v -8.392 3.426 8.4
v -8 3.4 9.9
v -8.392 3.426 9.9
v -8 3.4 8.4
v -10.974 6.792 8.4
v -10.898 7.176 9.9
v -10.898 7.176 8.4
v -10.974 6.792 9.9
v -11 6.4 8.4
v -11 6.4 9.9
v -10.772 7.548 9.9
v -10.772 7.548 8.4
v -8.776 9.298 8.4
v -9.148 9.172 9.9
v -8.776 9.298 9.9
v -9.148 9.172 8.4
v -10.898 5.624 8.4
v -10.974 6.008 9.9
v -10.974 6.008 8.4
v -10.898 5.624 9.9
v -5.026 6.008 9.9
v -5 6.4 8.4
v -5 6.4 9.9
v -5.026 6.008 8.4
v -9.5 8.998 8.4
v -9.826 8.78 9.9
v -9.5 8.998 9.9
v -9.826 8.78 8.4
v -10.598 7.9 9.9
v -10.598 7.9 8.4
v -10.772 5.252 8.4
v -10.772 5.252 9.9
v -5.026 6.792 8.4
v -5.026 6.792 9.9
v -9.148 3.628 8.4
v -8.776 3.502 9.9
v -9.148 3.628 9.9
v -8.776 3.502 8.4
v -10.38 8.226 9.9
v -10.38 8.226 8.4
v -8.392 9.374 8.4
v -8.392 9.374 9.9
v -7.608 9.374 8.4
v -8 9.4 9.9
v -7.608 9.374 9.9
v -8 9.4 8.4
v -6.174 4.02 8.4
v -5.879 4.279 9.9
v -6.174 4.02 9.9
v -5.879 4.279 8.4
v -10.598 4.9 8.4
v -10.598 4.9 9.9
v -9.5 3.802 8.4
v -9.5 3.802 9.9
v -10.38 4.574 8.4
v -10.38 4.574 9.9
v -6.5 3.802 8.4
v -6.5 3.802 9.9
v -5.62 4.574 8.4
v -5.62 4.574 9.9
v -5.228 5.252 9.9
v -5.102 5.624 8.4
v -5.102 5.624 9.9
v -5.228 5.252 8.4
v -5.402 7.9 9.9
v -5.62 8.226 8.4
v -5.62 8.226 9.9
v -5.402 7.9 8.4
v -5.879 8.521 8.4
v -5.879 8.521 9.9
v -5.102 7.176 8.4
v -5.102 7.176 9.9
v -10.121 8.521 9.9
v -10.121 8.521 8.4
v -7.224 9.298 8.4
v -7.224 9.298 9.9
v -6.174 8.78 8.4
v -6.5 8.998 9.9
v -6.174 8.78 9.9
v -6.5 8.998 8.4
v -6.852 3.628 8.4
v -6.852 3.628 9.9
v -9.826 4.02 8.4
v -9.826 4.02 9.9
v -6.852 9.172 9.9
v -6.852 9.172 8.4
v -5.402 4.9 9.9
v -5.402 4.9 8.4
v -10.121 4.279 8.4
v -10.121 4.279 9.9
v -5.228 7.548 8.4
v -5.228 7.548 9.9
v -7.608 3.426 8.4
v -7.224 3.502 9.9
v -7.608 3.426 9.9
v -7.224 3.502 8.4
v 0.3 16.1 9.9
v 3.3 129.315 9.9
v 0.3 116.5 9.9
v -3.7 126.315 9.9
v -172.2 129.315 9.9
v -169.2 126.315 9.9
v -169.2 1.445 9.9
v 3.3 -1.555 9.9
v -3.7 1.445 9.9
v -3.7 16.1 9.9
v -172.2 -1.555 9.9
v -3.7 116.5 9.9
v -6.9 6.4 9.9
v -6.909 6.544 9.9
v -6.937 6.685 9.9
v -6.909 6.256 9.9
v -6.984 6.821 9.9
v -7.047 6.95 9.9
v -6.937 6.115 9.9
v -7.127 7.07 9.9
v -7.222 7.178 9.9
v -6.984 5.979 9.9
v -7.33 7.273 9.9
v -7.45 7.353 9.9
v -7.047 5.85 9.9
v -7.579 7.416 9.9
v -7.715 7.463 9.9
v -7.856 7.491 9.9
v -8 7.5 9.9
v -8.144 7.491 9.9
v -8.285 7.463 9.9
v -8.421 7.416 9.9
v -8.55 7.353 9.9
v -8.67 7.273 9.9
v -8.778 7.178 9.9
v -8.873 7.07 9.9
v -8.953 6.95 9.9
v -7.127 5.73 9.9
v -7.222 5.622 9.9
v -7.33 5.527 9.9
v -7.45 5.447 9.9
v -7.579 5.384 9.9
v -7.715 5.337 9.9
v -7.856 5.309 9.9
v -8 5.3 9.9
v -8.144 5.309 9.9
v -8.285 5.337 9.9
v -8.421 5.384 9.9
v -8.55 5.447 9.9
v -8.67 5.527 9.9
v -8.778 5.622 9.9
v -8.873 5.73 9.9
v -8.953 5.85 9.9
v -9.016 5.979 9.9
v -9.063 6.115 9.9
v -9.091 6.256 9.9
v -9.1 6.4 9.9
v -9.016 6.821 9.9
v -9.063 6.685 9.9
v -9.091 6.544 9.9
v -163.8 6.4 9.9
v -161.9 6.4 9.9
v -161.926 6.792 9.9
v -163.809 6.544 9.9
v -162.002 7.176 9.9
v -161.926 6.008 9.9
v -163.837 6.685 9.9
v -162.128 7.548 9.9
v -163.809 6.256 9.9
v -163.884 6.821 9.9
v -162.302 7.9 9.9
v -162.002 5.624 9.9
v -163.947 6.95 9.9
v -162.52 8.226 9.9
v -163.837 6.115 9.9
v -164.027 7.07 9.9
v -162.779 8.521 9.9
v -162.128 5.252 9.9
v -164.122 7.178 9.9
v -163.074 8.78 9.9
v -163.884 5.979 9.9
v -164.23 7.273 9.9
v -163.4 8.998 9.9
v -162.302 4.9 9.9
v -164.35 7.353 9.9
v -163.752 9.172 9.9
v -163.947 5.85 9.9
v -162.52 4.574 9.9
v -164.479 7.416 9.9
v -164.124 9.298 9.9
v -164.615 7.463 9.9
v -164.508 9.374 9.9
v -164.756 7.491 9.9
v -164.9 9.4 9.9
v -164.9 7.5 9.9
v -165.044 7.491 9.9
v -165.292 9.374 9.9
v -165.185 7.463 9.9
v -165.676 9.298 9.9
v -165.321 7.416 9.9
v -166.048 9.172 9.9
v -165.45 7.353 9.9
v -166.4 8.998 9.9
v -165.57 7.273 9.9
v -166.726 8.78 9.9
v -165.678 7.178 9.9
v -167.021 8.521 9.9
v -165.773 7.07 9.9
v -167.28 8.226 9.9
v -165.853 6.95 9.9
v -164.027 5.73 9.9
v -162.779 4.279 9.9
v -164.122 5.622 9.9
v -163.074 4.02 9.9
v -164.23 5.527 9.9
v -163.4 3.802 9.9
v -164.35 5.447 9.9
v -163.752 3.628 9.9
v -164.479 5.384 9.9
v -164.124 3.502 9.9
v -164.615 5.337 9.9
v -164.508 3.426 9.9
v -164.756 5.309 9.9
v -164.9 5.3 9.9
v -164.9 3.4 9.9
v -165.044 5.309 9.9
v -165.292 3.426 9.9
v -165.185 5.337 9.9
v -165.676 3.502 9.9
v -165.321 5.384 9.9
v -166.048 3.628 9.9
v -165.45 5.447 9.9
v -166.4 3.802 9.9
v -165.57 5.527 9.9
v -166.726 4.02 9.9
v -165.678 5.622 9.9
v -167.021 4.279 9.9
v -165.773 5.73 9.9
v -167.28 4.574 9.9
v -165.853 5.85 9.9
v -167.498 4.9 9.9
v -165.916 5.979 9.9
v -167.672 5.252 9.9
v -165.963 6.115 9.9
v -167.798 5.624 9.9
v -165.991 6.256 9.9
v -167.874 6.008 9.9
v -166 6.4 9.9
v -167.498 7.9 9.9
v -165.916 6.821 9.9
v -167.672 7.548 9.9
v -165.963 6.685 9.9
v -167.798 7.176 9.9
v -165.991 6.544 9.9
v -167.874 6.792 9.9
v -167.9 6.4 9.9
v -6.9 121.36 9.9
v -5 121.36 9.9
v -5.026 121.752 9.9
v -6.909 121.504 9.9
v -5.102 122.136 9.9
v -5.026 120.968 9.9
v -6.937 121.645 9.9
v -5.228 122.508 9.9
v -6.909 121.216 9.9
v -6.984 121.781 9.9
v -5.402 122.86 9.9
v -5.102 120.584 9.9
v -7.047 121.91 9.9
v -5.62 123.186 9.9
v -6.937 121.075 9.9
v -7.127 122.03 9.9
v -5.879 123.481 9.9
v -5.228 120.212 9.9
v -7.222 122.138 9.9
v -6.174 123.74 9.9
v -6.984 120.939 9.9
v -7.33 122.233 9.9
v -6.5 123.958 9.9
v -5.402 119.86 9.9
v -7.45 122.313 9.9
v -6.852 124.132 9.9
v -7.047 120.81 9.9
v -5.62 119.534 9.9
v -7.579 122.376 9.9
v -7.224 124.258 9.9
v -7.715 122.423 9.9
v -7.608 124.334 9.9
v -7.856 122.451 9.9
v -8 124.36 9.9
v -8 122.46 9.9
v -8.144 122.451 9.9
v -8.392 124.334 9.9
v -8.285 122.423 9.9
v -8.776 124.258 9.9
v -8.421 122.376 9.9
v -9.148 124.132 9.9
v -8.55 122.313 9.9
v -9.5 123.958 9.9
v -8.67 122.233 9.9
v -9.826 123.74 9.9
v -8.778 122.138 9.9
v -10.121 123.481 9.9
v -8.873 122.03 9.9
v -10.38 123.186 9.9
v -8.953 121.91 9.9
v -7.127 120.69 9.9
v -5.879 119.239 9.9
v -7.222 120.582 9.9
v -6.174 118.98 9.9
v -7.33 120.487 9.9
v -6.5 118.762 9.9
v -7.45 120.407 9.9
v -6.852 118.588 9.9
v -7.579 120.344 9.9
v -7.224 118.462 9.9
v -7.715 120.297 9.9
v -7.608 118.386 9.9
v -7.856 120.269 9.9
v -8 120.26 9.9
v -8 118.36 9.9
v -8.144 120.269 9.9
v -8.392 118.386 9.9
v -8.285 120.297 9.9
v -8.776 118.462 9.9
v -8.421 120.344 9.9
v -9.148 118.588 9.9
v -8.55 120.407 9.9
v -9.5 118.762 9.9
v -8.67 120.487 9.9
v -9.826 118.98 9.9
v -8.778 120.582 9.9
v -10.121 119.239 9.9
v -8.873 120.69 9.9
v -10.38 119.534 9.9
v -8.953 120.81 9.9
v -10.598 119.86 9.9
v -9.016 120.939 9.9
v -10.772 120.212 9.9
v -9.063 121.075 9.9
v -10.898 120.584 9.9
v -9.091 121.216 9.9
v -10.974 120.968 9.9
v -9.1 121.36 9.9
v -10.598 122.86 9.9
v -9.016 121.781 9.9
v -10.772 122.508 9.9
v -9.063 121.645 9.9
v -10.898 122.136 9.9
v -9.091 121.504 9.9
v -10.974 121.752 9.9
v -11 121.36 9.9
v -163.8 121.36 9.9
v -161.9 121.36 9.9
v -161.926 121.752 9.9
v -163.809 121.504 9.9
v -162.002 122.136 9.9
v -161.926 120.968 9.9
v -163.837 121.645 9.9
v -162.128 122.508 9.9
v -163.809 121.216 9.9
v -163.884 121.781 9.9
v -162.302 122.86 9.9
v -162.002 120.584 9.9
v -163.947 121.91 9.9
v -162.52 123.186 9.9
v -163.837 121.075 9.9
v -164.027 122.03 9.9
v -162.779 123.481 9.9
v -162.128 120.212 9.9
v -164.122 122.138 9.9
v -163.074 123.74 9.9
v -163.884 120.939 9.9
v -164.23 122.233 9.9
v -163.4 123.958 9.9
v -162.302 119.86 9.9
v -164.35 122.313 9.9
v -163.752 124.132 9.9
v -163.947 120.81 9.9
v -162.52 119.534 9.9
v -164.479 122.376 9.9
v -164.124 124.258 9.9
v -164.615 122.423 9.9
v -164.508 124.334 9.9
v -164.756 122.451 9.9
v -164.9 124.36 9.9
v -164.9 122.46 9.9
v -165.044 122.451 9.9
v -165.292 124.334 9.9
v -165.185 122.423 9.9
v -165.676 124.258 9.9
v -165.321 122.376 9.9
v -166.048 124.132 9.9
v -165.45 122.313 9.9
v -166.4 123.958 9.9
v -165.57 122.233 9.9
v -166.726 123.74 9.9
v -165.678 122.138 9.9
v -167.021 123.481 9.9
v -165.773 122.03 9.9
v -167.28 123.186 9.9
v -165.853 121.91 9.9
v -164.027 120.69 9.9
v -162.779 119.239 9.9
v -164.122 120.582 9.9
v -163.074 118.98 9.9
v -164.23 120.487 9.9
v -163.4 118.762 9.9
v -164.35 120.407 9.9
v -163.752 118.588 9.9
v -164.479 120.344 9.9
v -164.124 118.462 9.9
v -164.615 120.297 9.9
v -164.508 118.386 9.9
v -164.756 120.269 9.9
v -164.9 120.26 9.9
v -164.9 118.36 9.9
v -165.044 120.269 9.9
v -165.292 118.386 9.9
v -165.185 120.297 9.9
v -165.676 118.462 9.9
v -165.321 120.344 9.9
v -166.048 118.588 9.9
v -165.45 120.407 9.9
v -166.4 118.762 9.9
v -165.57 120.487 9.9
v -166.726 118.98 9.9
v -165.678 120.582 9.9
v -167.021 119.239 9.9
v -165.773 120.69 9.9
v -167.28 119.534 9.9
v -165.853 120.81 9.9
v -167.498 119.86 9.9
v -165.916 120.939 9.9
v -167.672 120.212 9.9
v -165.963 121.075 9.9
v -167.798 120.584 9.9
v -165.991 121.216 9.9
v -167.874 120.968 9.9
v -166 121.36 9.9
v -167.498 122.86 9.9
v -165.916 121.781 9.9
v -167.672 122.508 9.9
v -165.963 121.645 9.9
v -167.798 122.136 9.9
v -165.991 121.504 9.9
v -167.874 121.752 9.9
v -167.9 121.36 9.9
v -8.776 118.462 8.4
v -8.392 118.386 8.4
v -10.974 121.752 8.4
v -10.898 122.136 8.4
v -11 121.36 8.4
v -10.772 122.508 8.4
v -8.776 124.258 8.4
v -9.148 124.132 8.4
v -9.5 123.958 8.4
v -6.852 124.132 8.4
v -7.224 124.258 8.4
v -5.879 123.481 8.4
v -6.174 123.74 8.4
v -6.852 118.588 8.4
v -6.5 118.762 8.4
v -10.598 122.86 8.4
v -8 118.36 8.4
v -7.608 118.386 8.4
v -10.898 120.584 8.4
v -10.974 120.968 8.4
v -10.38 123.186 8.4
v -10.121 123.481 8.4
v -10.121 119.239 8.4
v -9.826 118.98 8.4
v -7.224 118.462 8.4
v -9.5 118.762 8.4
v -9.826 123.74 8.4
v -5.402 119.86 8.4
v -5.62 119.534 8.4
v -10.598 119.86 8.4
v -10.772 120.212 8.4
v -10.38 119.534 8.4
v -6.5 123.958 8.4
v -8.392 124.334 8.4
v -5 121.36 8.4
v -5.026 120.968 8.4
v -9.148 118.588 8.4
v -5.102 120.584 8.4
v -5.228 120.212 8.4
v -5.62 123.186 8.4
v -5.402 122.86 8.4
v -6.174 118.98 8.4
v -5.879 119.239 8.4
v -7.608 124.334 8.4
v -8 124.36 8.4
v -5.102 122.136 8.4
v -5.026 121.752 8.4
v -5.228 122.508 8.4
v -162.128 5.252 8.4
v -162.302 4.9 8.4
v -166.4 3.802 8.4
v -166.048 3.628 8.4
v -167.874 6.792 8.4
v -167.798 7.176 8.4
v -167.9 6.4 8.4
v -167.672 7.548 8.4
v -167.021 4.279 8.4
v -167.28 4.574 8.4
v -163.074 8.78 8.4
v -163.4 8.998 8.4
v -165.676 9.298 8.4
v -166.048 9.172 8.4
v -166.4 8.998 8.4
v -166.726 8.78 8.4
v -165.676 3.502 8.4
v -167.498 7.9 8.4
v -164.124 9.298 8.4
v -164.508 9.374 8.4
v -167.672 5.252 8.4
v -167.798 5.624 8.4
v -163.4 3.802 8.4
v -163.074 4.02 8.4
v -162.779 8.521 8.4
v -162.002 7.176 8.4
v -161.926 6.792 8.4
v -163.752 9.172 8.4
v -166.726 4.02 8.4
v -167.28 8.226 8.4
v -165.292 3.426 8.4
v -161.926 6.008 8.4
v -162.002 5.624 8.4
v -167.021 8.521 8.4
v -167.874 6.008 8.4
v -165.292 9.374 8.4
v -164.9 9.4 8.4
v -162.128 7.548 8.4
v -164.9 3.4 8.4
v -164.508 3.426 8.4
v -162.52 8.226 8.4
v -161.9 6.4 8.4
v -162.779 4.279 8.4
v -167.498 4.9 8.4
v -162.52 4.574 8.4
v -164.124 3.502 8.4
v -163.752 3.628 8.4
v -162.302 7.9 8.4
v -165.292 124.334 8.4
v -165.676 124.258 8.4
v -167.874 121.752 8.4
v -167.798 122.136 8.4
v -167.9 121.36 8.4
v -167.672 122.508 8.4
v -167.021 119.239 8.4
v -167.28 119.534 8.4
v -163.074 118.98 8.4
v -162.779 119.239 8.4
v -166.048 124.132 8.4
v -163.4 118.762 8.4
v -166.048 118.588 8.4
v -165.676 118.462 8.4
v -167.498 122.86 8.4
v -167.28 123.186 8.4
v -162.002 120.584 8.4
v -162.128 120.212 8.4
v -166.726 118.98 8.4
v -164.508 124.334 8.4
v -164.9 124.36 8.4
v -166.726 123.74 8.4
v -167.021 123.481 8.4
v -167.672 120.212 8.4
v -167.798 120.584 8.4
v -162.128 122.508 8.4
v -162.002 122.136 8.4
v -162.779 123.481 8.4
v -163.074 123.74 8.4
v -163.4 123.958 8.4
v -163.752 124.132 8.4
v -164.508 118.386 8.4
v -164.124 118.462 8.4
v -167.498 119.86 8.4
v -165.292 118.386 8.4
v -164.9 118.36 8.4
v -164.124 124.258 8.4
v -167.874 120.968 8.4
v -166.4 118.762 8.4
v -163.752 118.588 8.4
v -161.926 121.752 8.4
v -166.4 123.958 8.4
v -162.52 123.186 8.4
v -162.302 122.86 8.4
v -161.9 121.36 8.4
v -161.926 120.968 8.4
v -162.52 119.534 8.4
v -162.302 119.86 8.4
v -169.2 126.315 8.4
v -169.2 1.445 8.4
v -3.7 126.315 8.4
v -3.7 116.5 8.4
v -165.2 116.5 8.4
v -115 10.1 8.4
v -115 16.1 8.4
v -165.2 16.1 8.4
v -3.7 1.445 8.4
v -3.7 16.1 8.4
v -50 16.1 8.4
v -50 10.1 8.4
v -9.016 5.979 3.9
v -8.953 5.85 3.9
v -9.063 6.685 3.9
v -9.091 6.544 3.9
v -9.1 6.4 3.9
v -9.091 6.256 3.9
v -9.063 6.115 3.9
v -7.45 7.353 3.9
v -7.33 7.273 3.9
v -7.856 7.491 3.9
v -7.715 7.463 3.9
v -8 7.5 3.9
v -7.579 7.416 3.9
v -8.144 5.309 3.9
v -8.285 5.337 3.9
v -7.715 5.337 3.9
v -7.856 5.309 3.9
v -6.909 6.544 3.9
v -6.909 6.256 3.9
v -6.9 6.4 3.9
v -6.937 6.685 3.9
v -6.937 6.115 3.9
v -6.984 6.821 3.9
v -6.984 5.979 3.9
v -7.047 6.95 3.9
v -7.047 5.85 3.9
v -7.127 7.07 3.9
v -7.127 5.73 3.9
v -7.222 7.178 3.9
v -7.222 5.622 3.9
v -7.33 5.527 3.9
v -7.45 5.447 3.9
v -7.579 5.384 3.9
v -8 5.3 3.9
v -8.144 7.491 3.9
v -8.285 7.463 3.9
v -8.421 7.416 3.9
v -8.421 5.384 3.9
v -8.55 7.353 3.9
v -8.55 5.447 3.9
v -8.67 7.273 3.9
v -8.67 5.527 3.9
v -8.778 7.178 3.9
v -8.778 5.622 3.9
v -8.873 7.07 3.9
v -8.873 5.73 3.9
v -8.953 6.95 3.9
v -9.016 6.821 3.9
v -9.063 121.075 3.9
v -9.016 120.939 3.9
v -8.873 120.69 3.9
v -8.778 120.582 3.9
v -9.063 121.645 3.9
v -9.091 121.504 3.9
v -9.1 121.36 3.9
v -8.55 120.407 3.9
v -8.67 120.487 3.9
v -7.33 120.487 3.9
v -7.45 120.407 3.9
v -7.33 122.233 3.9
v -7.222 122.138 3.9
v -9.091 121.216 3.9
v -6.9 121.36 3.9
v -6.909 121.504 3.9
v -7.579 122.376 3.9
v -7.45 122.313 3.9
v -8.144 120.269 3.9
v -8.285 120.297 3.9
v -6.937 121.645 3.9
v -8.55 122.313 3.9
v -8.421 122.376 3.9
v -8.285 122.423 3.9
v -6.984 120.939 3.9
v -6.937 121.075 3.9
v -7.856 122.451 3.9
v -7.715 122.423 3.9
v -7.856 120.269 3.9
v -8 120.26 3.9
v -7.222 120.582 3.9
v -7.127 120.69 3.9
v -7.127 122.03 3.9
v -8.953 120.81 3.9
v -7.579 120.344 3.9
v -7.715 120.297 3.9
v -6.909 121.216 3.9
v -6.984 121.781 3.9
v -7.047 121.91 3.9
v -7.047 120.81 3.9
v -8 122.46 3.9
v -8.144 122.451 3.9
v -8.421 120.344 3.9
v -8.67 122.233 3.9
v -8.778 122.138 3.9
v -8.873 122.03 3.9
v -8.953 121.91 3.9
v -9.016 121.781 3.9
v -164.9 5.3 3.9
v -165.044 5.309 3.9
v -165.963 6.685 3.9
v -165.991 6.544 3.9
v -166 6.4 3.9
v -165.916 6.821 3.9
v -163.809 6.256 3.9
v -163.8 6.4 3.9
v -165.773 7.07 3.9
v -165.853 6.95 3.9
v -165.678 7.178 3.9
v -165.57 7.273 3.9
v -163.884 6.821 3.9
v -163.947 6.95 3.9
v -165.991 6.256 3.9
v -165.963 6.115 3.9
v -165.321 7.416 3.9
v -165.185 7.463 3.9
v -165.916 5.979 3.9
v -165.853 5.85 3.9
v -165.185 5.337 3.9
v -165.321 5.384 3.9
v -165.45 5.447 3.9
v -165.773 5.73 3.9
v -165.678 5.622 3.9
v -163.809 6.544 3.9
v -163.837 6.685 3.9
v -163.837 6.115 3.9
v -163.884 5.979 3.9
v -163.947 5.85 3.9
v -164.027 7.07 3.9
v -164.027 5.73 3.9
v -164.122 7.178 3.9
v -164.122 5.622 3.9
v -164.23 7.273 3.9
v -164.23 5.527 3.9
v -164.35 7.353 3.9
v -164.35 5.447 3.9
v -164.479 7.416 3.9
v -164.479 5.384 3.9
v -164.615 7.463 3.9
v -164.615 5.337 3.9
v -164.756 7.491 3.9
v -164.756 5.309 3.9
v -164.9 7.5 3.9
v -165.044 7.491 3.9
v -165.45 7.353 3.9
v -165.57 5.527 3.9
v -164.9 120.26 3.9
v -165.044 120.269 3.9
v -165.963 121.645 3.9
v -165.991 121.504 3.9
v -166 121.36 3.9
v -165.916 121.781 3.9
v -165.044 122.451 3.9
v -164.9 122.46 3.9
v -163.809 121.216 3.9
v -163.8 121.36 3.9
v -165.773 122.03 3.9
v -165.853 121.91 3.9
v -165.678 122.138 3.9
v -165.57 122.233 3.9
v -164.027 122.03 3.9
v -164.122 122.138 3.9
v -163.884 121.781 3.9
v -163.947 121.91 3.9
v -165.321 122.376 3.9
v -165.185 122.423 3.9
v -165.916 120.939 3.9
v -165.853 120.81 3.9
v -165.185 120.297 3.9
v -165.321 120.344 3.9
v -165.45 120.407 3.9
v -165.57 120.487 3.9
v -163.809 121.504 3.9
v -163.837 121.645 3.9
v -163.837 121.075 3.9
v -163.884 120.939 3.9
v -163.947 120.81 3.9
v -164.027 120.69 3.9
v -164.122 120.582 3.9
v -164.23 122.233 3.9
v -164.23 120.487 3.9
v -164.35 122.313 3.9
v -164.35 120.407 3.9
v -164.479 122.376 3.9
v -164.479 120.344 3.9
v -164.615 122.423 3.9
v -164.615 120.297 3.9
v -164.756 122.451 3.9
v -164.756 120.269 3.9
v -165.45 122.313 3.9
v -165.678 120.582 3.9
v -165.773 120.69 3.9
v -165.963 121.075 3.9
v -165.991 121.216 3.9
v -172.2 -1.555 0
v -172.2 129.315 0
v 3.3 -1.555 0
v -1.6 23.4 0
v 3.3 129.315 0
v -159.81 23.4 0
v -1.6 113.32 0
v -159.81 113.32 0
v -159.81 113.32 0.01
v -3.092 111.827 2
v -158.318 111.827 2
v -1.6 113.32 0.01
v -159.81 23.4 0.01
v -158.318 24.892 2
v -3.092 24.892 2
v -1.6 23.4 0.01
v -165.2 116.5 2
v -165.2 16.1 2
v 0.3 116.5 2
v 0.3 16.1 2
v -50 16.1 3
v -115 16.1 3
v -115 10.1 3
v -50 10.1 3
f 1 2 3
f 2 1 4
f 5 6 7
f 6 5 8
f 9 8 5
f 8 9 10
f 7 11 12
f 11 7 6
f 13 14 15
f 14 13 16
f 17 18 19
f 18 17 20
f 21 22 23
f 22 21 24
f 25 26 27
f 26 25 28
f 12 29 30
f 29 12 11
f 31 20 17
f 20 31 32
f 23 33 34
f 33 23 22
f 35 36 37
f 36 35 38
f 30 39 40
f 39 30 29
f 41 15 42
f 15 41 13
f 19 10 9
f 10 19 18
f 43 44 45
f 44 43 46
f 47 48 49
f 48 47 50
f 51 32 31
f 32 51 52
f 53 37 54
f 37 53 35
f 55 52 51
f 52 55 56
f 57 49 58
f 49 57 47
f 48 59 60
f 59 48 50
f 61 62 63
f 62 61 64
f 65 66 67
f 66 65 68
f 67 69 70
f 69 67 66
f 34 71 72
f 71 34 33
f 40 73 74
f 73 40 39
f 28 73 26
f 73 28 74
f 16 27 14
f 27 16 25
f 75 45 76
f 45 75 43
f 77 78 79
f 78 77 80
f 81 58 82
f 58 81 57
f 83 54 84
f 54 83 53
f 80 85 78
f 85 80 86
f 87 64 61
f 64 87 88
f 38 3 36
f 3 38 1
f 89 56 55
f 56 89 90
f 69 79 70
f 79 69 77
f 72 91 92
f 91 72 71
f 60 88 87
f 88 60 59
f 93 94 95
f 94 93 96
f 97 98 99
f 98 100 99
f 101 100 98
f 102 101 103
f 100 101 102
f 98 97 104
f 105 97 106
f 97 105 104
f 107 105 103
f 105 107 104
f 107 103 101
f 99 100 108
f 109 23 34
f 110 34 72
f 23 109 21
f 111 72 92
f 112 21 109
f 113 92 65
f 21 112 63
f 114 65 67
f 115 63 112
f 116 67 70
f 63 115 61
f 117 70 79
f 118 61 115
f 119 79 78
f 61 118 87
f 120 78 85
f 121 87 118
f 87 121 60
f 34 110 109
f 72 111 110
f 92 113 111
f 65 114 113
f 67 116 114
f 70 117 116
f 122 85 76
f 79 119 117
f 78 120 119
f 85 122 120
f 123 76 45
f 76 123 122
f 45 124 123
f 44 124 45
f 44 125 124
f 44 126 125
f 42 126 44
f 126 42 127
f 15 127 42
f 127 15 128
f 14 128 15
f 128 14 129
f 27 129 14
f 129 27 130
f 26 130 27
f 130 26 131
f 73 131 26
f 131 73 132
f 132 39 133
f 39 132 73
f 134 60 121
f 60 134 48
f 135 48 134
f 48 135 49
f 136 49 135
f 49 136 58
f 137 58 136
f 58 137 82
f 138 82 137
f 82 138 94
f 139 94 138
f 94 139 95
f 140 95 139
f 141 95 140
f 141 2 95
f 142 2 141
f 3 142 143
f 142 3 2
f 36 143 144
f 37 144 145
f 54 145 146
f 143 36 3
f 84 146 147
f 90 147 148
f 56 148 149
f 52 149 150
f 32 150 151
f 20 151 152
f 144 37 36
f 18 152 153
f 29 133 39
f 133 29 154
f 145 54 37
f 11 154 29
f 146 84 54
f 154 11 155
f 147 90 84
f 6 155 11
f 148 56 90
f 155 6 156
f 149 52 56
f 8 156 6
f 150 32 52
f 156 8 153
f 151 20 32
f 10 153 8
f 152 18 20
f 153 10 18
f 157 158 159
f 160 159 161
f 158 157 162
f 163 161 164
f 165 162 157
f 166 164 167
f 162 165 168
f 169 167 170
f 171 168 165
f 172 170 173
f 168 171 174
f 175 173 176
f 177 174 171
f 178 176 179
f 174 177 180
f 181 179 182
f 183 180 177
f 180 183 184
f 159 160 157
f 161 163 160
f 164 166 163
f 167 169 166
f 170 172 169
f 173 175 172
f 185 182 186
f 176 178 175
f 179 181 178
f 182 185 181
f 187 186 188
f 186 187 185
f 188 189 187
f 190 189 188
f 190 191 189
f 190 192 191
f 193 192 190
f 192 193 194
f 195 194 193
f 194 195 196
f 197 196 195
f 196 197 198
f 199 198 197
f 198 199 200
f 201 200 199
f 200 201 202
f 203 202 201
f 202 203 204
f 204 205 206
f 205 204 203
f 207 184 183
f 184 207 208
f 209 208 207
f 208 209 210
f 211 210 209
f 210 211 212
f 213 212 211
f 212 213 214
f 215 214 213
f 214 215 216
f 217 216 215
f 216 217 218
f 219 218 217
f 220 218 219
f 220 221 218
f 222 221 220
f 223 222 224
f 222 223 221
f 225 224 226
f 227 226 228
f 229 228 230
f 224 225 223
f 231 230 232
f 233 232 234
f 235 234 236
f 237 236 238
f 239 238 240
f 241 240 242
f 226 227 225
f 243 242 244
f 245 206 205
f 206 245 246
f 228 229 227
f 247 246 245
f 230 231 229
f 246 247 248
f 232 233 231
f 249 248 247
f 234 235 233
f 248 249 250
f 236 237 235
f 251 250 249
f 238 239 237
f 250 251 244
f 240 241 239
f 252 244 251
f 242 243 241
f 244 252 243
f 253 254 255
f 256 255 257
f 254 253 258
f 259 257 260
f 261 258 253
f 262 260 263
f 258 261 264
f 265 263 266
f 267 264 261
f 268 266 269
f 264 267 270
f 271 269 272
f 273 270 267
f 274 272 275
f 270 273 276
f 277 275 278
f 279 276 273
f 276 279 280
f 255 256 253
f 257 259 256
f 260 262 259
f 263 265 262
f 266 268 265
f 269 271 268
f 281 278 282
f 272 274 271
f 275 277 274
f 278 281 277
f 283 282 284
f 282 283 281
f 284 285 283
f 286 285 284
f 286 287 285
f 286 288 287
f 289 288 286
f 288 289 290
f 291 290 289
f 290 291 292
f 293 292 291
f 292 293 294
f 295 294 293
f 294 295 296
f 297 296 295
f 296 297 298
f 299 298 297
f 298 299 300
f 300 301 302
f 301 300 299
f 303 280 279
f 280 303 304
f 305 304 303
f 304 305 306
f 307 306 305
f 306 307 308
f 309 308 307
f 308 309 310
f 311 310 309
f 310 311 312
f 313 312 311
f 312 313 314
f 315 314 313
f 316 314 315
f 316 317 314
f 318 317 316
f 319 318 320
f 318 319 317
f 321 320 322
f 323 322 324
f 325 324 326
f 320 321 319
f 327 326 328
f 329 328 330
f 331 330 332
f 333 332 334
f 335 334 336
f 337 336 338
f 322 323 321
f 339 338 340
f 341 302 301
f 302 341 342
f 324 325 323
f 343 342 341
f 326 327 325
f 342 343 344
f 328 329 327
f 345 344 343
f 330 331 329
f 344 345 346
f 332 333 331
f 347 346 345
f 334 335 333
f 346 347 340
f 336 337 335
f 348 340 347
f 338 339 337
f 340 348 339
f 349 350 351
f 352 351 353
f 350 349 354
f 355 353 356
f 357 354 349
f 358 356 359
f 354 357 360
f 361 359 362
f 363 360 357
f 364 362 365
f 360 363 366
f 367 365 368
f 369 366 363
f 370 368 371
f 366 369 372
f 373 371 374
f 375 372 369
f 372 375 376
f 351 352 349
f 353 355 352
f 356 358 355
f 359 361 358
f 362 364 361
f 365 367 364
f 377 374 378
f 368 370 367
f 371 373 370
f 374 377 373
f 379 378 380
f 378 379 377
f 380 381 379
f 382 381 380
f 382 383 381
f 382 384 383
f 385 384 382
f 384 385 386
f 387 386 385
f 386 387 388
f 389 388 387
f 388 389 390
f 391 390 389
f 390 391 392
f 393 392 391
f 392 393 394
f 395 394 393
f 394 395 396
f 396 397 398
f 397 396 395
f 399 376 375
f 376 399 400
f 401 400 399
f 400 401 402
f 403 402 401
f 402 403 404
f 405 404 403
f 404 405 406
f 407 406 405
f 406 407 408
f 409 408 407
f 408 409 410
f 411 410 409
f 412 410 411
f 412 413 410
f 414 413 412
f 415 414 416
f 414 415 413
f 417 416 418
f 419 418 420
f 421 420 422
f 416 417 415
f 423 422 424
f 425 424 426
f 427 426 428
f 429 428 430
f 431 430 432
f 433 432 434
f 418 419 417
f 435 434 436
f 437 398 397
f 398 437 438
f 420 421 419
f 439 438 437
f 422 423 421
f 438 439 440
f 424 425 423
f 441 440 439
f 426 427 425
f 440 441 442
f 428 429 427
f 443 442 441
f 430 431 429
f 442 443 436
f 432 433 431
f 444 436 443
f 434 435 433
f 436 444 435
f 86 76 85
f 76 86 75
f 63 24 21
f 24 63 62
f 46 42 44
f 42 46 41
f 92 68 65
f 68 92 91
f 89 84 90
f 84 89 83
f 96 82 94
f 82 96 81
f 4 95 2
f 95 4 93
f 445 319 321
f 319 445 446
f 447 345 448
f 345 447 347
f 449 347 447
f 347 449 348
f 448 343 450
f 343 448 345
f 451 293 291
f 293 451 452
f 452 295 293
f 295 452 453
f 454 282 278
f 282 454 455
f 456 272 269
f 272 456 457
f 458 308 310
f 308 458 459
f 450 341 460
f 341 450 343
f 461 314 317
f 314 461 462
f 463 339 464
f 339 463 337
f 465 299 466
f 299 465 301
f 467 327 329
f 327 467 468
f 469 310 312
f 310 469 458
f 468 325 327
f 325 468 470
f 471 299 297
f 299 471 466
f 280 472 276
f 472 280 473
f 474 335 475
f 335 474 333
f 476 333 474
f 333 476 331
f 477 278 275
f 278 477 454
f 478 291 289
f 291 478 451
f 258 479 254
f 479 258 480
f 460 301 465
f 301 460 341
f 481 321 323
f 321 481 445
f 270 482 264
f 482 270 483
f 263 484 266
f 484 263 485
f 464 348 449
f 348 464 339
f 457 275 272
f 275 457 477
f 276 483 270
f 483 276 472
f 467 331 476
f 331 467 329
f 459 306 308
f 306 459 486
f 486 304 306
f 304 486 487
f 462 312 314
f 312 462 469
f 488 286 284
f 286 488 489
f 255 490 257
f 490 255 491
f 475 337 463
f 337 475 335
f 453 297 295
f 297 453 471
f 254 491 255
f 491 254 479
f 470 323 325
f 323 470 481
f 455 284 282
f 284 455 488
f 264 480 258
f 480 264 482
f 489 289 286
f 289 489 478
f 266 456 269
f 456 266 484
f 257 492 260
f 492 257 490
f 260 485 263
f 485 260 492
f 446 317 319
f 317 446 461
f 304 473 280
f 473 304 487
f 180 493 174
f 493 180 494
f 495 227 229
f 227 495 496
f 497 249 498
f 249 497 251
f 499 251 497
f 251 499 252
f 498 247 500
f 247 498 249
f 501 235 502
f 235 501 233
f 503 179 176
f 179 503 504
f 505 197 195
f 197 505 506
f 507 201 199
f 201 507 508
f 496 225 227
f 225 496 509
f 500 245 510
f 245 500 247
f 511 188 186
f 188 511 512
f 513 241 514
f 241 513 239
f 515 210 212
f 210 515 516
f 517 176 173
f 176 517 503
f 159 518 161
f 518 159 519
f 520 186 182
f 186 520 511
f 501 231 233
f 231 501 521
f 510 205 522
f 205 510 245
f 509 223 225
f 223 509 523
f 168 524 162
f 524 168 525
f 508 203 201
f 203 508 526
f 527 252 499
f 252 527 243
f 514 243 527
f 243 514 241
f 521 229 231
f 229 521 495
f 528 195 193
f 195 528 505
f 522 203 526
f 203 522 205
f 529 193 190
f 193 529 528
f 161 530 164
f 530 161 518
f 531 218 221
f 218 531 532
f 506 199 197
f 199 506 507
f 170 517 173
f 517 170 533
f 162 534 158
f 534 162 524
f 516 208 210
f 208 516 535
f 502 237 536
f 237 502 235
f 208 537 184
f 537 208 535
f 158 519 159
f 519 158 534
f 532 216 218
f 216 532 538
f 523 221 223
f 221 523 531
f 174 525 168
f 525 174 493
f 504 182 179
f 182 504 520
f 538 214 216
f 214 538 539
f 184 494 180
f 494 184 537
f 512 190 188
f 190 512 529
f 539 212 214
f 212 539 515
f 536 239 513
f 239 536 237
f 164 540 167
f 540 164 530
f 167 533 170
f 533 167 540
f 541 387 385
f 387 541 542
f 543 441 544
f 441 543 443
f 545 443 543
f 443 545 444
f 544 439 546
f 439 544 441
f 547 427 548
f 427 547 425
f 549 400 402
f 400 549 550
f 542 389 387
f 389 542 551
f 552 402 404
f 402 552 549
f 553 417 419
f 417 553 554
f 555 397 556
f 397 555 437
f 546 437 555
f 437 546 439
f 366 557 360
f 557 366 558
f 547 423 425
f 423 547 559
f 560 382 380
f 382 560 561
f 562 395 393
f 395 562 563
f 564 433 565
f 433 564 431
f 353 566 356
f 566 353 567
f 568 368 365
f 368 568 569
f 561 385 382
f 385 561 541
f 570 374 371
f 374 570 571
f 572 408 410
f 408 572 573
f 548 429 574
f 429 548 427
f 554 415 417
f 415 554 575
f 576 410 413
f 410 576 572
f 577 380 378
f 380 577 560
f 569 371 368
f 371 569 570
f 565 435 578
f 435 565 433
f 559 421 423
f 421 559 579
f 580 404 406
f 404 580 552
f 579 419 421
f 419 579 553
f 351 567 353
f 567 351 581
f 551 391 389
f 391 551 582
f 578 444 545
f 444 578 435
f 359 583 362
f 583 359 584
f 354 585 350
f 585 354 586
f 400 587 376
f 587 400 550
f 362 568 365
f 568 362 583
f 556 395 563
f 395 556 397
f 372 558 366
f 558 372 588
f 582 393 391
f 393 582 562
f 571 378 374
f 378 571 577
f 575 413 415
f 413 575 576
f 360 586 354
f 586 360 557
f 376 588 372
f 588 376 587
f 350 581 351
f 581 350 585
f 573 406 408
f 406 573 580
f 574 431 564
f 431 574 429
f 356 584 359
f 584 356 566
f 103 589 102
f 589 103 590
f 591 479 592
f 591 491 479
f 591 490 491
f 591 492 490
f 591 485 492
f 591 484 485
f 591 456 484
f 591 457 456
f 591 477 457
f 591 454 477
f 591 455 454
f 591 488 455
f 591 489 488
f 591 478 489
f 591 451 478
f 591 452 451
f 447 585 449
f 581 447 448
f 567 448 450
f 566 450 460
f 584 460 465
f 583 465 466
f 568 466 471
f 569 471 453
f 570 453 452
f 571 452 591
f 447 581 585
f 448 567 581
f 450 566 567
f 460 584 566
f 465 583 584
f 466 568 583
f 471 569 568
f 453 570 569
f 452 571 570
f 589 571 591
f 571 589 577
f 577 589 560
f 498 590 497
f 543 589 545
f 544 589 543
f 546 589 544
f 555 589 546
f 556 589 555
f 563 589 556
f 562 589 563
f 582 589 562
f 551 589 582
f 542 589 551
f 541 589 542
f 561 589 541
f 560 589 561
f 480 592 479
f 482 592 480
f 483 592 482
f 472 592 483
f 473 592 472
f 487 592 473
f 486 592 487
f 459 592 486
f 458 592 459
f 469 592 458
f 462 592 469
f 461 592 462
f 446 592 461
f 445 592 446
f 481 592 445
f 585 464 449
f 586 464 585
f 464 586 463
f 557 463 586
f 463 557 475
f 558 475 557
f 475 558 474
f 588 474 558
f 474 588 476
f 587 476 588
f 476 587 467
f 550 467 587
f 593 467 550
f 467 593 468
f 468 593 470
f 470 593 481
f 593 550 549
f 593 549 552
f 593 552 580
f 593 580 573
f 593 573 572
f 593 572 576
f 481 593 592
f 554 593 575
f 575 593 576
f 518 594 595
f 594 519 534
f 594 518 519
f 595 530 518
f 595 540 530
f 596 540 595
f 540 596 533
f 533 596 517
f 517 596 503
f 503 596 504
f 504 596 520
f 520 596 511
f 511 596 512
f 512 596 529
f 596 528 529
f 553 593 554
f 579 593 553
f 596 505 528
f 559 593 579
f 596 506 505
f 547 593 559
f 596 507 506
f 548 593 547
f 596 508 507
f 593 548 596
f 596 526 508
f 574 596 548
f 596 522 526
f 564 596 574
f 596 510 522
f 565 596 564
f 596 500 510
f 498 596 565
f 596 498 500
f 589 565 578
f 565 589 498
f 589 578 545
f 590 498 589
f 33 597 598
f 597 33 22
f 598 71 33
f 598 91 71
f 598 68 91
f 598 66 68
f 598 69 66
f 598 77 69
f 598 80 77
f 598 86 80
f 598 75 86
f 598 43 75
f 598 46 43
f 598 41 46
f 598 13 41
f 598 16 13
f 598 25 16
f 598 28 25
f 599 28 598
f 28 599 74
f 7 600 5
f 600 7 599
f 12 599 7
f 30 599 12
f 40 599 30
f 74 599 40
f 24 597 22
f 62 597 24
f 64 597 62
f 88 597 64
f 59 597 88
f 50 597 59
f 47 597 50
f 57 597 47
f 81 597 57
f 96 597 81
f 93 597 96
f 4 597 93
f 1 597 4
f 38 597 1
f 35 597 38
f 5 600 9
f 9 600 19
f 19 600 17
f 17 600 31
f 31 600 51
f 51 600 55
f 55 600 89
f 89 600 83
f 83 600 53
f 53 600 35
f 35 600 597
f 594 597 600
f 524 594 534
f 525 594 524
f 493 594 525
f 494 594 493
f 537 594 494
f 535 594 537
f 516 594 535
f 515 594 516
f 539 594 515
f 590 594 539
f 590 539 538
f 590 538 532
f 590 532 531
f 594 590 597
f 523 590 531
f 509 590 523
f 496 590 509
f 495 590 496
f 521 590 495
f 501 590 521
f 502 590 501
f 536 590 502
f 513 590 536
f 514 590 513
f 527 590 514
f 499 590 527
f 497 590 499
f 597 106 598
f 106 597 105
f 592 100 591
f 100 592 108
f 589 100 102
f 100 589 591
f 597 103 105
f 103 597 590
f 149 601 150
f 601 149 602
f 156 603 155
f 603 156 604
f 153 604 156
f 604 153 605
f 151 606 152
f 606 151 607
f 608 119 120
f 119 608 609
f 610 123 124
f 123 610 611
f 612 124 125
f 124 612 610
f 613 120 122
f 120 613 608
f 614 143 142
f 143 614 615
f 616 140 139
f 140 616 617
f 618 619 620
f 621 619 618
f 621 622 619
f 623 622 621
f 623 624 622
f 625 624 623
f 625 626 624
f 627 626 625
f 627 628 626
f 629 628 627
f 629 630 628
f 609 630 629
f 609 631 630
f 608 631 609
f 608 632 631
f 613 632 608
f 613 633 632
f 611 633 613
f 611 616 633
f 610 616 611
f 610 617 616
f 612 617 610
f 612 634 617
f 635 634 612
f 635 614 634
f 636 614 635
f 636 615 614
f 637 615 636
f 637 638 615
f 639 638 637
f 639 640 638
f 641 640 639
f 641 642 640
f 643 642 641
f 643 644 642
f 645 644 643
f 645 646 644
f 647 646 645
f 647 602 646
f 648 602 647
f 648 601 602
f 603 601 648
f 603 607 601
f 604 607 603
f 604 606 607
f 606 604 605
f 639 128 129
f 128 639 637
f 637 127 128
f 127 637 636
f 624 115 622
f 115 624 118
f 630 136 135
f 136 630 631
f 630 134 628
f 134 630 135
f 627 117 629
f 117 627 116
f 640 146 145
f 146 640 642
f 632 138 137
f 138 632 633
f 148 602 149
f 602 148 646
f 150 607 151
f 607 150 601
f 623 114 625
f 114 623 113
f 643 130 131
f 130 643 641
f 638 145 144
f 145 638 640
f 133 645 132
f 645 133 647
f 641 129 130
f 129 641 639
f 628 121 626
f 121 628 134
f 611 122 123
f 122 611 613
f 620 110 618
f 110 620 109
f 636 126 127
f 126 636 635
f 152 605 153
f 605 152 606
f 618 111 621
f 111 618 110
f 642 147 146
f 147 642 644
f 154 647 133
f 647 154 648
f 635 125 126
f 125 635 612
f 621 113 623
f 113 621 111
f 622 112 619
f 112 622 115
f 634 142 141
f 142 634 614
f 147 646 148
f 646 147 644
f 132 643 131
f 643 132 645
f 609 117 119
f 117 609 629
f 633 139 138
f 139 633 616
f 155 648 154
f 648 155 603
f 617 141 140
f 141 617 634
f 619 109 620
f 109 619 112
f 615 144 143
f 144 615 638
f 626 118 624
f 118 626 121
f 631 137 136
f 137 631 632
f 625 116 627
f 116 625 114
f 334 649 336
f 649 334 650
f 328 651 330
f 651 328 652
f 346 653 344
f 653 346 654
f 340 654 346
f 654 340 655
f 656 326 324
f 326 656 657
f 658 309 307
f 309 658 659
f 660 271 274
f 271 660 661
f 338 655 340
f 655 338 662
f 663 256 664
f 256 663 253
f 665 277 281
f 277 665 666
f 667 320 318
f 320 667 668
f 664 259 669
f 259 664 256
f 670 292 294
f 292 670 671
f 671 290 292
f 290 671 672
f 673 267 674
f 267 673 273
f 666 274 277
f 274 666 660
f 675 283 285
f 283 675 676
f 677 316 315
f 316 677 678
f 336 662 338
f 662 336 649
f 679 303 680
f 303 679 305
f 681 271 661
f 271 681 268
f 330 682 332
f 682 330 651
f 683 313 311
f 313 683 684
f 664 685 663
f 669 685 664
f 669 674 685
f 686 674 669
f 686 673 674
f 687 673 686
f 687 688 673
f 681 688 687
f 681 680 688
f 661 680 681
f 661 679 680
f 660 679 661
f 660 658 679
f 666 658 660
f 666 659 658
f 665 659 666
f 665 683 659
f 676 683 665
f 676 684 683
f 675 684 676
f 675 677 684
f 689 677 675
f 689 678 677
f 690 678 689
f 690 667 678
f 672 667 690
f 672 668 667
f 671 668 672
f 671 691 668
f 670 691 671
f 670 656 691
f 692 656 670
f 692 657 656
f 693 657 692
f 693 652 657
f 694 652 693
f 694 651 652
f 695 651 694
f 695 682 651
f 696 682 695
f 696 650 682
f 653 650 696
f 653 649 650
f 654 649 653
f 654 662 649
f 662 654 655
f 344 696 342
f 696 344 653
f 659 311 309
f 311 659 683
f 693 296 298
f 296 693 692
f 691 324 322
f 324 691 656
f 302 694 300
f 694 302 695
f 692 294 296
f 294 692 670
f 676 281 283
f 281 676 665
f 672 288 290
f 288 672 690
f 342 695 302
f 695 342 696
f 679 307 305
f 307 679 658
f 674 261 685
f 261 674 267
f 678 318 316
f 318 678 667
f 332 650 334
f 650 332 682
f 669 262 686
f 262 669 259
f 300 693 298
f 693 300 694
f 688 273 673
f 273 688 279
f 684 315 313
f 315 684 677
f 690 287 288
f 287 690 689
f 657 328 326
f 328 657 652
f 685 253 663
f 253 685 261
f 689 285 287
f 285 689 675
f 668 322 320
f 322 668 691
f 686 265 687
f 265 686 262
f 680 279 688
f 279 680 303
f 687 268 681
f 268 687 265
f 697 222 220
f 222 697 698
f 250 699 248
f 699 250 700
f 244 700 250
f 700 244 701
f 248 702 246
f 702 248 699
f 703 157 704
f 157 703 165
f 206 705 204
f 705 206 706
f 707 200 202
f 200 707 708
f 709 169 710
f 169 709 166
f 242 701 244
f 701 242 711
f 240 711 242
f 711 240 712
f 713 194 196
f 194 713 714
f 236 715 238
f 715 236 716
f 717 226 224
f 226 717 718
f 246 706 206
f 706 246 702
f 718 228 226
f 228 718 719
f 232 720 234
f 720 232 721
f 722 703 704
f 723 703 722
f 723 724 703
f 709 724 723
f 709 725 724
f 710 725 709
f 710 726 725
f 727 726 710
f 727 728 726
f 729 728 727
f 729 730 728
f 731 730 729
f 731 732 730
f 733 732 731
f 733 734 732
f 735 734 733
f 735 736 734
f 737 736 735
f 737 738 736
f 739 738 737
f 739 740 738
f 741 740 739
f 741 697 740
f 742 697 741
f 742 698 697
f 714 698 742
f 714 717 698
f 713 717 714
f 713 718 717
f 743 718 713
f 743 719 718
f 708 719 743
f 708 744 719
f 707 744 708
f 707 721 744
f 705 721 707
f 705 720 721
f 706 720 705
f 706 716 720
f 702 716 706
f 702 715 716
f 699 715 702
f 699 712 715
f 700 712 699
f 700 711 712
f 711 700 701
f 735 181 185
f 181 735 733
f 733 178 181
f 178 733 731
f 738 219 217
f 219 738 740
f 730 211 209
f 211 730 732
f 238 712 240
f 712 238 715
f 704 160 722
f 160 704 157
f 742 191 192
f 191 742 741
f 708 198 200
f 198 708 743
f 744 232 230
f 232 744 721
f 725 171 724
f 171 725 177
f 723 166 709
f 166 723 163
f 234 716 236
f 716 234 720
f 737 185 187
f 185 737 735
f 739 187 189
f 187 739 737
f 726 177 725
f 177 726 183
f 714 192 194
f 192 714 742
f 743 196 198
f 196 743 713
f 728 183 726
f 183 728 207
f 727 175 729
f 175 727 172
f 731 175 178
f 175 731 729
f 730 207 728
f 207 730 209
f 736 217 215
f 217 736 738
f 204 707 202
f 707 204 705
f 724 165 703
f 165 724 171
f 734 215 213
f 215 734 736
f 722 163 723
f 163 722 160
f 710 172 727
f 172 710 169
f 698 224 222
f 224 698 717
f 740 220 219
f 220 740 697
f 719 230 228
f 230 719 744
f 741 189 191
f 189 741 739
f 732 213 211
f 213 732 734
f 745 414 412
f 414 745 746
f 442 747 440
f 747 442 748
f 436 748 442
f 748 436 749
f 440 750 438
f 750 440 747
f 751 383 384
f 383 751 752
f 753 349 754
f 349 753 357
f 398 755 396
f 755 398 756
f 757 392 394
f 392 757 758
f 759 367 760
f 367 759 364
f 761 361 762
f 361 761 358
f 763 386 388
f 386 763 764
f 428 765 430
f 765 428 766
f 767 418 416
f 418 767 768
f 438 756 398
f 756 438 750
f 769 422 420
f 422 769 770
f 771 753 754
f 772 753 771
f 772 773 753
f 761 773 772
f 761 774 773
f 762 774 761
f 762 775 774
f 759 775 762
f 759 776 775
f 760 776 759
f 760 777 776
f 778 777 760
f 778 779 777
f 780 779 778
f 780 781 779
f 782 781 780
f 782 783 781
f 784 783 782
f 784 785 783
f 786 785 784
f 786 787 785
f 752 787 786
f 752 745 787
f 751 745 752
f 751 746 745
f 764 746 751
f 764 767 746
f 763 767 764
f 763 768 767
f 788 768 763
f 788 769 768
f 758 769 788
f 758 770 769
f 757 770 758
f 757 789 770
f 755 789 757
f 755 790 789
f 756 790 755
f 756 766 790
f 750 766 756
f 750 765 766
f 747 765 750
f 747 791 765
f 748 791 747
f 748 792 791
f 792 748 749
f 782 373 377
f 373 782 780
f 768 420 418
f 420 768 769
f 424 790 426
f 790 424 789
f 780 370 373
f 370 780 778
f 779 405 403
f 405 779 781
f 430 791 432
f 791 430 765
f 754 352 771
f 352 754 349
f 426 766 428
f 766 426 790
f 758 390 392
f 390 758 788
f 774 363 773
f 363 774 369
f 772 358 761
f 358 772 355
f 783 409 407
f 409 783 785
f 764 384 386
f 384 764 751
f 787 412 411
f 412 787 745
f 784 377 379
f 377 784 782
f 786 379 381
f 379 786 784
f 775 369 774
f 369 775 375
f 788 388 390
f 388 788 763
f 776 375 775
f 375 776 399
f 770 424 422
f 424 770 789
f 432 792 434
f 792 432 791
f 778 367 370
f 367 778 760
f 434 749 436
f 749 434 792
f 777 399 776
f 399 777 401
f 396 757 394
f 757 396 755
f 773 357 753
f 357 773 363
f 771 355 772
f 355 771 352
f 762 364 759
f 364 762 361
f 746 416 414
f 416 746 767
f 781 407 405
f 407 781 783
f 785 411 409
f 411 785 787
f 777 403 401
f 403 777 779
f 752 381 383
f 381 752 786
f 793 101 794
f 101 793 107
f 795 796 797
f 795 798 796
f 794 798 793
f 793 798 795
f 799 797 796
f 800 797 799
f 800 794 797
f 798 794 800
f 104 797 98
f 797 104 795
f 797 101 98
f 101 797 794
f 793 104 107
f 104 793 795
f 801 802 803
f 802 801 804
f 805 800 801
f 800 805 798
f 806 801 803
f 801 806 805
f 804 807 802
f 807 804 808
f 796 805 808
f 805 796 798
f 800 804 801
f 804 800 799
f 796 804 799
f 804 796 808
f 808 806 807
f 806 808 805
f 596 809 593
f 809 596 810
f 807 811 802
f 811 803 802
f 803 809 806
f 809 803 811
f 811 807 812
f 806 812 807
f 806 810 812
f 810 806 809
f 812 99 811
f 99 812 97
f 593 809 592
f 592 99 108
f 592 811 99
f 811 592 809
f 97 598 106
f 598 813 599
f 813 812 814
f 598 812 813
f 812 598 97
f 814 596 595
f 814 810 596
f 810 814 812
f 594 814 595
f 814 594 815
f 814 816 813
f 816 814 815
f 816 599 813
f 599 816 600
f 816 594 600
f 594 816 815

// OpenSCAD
// Prisma — marco de pantalla, PIEZA DE PRUEBA v0.4 (D043) → stl/marco_pantalla_prueba_v0_4.stl
// v0.4: taladros colocados con las medidas tomadas en la pantalla (22/10): el izquierdo a 8 mm del
// borde izquierdo del cristal y el inferior a 10 mm por debajo del cristal; el superior queda a
// ≈5 mm por encima y el derecho, en el borde derecho del cristal. El PCB va 4 mm a la derecha del
// cristal, así que el marco crece por ese lado.
// v0.3: la v0.2 tenía el desplazamiento de 2,5 mm en horizontal (174 × 130,9 mm); es vertical.
// v0.2: la v0.1 salía en espejo (la ventana quedaba desplazada: 4 mm de borde negro a la
// derecha y 3 mm de imagen tapados a la izquierda). Ahora X va de izquierda a derecha
// mirando la cara vista, como en la capucha. Taladros (y PCB) 2,5 mm más arriba.
// Waveshare 7" HDMI LCD (C) Rev4.1, montada en horizontal.
//
// Sirve para comprobar el encaje real de la pantalla antes de imprimir la carcasa:
// ventana del área visible, alojamiento del cristal, apoyo del PCB y los 4 taladros.
// No lleva todavía la unión a la carcasa (eso irá en el frontal definitivo).
//
// Impresión: cara frontal sobre la cama (Z = 0 abajo), sin soportes.
// Montaje: el cristal entra en el alojamiento desde atrás; el PCB apoya en 4
// resaltes y se fija con 4 tornillos M2.5 × 6 autorroscantes (o insertos M2.5).
//
// Coordenadas: X = ancho de la pantalla, de izquierda a derecha mirando de frente (conectores
// a la derecha), Y = alto (Y = 0 en el borde inferior de las pestañas, flex del LCD abajo),
// Z = grosor (Z = 0 cara frontal vista). Como la cara vista va hacia abajo, la pieza se
// genera en espejo para que de frente X crezca hacia la derecha.

include <parametros.scad>;
$fn = 48;

// ---------------------------------------------------------------------------
// Parámetros del marco
// ---------------------------------------------------------------------------
fit        = 0.3;   // holgura por lado alrededor del cristal y del PCB
skin       = 2.0;   // grosor delante del cristal
frame_wall = 3.0;   // borde exterior alrededor del PCB
win_margin = 0.5;   // la ventana es el área visible + este margen por lado
win_chamfer = 1.5;  // chaflán de la ventana hacia delante (ángulo de visión)
pcb_relief = 1.5;   // rebaje detrás para que el PCB solo apoye en los resaltes
boss_d     = 6;     // resaltes de apoyo en los taladros
pilot_d    = 2.2;   // agujero para M2.5 autorroscante (3,5 para inserto M2.5)
pilot_depth = 6;

// Flex del LCD: sobresale por debajo del cristal, entre LCD y PCB
fpc_x0 = 50; fpc_x1 = 115; fpc_drop = 6;   // cubre la posición de la v0.1 (que no rozaba) y su espejo

T = skin + screen_t;   // grosor total: cara vista → cara delantera del PCB

// Posiciones derivadas (coordenadas de pantalla)
holes = screen_holes;
// Contorno del PCB (con el desplazamiento medido) y de la placa del marco, que abarca cristal y PCB
pcb = [screen_pcb_dx, screen_pcb_dz, screen_w, screen_h];
px0 = min(0, screen_pcb_dx) - fit - frame_wall;
px1 = max(screen_w, screen_pcb_dx + screen_w) + fit + frame_wall;
pz0 = min(glass_z0, screen_pcb_dz) - fit - frame_wall;
pz1 = max(glass_z0 + glass_h, screen_pcb_dz + screen_h) + fit + frame_wall;
glass = [0, glass_z0, screen_w, glass_h];                       // x, y, ancho, alto
win   = [screen_active_x0 - win_margin, screen_active_z0 - win_margin,
         screen_active_w + 2 * win_margin, screen_active_h + 2 * win_margin];

module rect(r, z0, h, grow = 0) {
    translate([r[0] - grow, r[1] - grow, z0]) cube([r[2] + 2 * grow, r[3] + 2 * grow, h]);
}

module marco() {
    difference() {
        // placa
        translate([px0, pz0, 0]) cube([px1 - px0, pz1 - pz0, T]);

        // ventana con chaflán hacia la cara vista
        hull() {
            rect(win, skin - 0.01, 0.02);
            rect(win, -0.01, 0.02, win_chamfer);
        }
        rect(win, skin - 0.1, T);

        // alojamiento del cristal
        rect(glass, skin, T, fit);

        // rebaje del PCB (contorno completo con pestañas), excepto los resaltes
        difference() {
            translate([pcb[0] - fit, pcb[1] - fit, T - pcb_relief]) cube([pcb[2] + 2 * fit, pcb[3] + 2 * fit, T]);
            for (h = holes) translate([h[0], h[1], 0]) cylinder(d = boss_d, h = T);
        }

        // hueco para el flex del LCD bajo el cristal
        translate([fpc_x0, glass_z0 - fit - fpc_drop, skin + 1])
            cube([fpc_x1 - fpc_x0, fpc_drop + 1, T]);

        // agujeros de los tornillos
        for (h = holes) translate([h[0], h[1], T - pilot_depth]) cylinder(d = pilot_d, h = pilot_depth + 1);
    }
}

// Referencia visual de la pantalla (no se imprime)
module pantalla_ref() {
    color([0.1, 0.1, 0.1, 0.6]) rect(glass, skin, screen_t);
    color([0.1, 0.25, 0.5, 0.6]) translate([screen_pcb_dx, screen_pcb_dz, T]) cube([screen_w, screen_h, screen_pcb_t]);
}

show_ref = false;
// espejo: vista desde la cara frontal (z < 0), X crece hacia la derecha
mirror([1, 0, 0]) {
    color([0.85, 0.85, 0.88]) marco();
    if (show_ref) pantalla_ref();
}
